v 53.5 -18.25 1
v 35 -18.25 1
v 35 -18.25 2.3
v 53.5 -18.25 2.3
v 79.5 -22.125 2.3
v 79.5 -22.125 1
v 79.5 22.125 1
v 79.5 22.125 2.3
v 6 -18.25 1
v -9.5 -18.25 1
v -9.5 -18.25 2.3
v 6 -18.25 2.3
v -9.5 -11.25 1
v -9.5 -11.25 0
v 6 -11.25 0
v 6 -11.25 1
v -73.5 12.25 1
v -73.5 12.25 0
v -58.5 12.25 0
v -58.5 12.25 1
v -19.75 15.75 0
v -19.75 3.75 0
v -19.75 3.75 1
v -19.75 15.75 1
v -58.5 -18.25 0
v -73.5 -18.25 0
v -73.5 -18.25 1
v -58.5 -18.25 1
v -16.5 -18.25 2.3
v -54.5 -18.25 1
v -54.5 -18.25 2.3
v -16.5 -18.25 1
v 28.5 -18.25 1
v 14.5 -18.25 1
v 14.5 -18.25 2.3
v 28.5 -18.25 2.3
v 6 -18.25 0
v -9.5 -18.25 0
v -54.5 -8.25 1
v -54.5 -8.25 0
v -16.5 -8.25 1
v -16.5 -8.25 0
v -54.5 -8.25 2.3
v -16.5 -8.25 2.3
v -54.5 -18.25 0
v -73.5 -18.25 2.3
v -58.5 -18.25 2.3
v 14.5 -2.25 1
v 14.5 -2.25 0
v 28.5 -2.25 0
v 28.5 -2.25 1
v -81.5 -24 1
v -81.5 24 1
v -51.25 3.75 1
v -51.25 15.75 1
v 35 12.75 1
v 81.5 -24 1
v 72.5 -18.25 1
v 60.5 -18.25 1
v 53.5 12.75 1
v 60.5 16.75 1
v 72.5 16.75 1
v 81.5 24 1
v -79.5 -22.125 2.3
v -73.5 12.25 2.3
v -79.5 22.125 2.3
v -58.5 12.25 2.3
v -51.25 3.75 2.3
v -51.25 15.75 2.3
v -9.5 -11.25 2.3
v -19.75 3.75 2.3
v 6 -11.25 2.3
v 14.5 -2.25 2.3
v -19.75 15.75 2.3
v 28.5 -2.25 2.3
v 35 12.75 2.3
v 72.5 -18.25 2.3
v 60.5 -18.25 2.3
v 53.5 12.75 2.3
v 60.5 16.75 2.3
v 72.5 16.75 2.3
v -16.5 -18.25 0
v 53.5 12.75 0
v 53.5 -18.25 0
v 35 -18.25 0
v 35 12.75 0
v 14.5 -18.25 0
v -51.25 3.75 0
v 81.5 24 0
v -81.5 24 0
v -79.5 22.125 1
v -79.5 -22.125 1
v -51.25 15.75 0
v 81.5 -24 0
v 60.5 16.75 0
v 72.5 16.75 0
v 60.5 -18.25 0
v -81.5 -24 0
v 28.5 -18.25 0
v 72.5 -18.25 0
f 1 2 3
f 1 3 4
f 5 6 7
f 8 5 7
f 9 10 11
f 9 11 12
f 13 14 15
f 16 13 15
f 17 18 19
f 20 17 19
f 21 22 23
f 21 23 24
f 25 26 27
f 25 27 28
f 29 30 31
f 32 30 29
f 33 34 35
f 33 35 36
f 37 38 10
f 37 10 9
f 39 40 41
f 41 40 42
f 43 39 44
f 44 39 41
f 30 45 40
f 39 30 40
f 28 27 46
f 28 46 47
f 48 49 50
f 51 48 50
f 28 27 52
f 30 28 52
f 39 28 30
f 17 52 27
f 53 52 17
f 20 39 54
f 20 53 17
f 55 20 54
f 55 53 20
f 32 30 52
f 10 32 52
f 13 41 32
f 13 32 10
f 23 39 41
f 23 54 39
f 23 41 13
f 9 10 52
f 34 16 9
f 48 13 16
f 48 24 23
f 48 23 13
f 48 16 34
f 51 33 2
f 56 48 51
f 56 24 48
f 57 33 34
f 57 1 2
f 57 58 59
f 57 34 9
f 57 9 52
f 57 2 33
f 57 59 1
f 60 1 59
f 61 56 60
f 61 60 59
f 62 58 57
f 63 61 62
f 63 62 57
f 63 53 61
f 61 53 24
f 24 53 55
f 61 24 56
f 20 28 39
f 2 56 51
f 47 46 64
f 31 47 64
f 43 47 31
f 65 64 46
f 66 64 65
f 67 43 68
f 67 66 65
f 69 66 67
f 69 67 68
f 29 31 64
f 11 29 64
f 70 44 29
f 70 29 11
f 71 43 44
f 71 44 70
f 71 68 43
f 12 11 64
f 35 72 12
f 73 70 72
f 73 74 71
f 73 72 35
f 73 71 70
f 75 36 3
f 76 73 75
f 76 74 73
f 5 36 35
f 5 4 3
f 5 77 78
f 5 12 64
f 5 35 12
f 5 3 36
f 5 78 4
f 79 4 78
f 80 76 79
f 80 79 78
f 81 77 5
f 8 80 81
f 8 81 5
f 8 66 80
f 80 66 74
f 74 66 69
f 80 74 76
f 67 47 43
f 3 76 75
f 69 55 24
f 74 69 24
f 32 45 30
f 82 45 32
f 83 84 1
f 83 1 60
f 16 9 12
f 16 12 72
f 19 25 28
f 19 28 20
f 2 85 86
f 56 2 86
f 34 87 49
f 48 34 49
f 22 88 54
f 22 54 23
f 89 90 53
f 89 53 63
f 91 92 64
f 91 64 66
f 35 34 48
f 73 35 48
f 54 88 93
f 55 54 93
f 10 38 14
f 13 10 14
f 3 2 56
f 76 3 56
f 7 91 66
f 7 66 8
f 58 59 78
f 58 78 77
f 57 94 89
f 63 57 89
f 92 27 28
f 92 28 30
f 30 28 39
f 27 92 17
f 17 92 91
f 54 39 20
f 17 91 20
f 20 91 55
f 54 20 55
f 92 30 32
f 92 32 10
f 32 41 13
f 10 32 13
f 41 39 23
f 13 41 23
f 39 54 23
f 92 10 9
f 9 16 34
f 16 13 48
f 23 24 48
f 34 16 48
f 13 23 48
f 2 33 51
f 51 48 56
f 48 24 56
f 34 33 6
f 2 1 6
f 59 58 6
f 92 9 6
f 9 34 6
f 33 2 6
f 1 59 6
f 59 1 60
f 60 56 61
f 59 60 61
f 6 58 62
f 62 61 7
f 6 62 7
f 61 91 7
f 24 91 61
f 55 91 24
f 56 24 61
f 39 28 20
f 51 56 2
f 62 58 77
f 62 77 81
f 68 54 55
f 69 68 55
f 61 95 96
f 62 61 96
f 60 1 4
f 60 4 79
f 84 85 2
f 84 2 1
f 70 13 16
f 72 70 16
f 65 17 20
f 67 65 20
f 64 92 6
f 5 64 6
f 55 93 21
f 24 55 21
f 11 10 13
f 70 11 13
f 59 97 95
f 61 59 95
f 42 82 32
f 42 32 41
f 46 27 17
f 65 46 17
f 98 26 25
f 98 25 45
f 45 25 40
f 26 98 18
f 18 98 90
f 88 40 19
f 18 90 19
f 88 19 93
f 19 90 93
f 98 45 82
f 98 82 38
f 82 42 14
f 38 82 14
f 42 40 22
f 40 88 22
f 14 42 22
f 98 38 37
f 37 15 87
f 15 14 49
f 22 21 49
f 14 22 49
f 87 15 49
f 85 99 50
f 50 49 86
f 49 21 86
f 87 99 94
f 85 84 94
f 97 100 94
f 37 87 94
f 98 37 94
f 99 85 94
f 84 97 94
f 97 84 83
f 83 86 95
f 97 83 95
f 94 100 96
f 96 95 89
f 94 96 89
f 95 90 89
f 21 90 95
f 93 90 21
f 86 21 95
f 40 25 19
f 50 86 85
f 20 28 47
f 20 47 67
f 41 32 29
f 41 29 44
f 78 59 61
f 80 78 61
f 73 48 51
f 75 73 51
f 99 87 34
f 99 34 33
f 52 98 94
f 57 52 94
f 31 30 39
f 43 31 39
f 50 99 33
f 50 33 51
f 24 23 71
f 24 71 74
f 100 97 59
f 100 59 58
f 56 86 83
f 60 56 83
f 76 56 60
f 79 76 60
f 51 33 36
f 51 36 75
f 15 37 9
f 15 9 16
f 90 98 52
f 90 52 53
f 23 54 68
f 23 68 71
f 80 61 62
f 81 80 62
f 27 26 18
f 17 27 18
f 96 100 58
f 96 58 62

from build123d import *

# Parameters (mm, degrees)
SKETCH_W      = 159
SKETCH_H      = 44.25
SKETCH_W_2    = 12
SKETCH_H_2    = 35
SKETCH_W_3    = 18.5
SKETCH_H_3    = 31
SKETCH_W_4    = 14
SKETCH_H_4    = 16
SKETCH_W_5    = 15.5
SKETCH_H_5    = 7
SKETCH_W_6    = 38
SKETCH_H_6    = 10
SKETCH_W_7    = 31.5
SKETCH_H_7    = 12
SKETCH_W_8    = 15
SKETCH_H_8    = 30.5
PAD001_DEPTH  = 1.3
SKETCH002_W   = 163
SKETCH002_H   = 48
SKETCH002_W_2 = 12
SKETCH002_H_2 = 35
SKETCH002_W_3 = 18.5
SKETCH002_H_3 = 31
SKETCH002_W_4 = 14
SKETCH002_H_4 = 16
SKETCH002_W_5 = 15.5
SKETCH002_H_5 = 7
SKETCH002_W_6 = 38
SKETCH002_H_6 = 10
SKETCH002_W_7 = 31.5
SKETCH002_H_7 = 12
SKETCH002_W_8 = 15
SKETCH002_H_8 = 30.5
PAD_DEPTH     = 1


with BuildPart() as pad001:
    # Sketch → Pad001 (new body)
    with BuildSketch(Plane.XY.offset(1)):
        Rectangle(SKETCH_W, SKETCH_H)
        with Locations((66.5, -0.75)):
            Rectangle(SKETCH_W_2, SKETCH_H_2, mode=Mode.SUBTRACT)
        with Locations((44.25, -2.75)):
            Rectangle(SKETCH_W_3, SKETCH_H_3, mode=Mode.SUBTRACT)
        with Locations((21.5, -10.25)):
            Rectangle(SKETCH_W_4, SKETCH_H_4, mode=Mode.SUBTRACT)
        with Locations((-1.75, -14.75)):
            Rectangle(SKETCH_W_5, SKETCH_H_5, mode=Mode.SUBTRACT)
        with Locations((-35.5, -13.25)):
            Rectangle(SKETCH_W_6, SKETCH_H_6, mode=Mode.SUBTRACT)
        with Locations((-35.5, 9.75)):
            Rectangle(SKETCH_W_7, SKETCH_H_7, mode=Mode.SUBTRACT)
        with Locations((-66, -3)):
            Rectangle(SKETCH_W_8, SKETCH_H_8, mode=Mode.SUBTRACT)
    extrude(amount=PAD001_DEPTH)


with BuildPart() as pad:
    # Sketch002 → Pad (new body)
    with BuildSketch(Plane.XY):
        Rectangle(SKETCH002_W, SKETCH002_H)
        with Locations((66.5, -0.75)):
            Rectangle(SKETCH002_W_2, SKETCH002_H_2, mode=Mode.SUBTRACT)
        with Locations((44.25, -2.75)):
            Rectangle(SKETCH002_W_3, SKETCH002_H_3, mode=Mode.SUBTRACT)
        with Locations((21.5, -10.25)):
            Rectangle(SKETCH002_W_4, SKETCH002_H_4, mode=Mode.SUBTRACT)
        with Locations((-1.75, -14.75)):
            Rectangle(SKETCH002_W_5, SKETCH002_H_5, mode=Mode.SUBTRACT)
        with Locations((-35.5, -13.25)):
            Rectangle(SKETCH002_W_6, SKETCH002_H_6, mode=Mode.SUBTRACT)
        with Locations((-35.5, 9.75)):
            Rectangle(SKETCH002_W_7, SKETCH002_H_7, mode=Mode.SUBTRACT)
        with Locations((-66, -3)):
            Rectangle(SKETCH002_W_8, SKETCH002_H_8, mode=Mode.SUBTRACT)
    extrude(amount=PAD_DEPTH)


solid = Compound([pad001.part, pad.part])
